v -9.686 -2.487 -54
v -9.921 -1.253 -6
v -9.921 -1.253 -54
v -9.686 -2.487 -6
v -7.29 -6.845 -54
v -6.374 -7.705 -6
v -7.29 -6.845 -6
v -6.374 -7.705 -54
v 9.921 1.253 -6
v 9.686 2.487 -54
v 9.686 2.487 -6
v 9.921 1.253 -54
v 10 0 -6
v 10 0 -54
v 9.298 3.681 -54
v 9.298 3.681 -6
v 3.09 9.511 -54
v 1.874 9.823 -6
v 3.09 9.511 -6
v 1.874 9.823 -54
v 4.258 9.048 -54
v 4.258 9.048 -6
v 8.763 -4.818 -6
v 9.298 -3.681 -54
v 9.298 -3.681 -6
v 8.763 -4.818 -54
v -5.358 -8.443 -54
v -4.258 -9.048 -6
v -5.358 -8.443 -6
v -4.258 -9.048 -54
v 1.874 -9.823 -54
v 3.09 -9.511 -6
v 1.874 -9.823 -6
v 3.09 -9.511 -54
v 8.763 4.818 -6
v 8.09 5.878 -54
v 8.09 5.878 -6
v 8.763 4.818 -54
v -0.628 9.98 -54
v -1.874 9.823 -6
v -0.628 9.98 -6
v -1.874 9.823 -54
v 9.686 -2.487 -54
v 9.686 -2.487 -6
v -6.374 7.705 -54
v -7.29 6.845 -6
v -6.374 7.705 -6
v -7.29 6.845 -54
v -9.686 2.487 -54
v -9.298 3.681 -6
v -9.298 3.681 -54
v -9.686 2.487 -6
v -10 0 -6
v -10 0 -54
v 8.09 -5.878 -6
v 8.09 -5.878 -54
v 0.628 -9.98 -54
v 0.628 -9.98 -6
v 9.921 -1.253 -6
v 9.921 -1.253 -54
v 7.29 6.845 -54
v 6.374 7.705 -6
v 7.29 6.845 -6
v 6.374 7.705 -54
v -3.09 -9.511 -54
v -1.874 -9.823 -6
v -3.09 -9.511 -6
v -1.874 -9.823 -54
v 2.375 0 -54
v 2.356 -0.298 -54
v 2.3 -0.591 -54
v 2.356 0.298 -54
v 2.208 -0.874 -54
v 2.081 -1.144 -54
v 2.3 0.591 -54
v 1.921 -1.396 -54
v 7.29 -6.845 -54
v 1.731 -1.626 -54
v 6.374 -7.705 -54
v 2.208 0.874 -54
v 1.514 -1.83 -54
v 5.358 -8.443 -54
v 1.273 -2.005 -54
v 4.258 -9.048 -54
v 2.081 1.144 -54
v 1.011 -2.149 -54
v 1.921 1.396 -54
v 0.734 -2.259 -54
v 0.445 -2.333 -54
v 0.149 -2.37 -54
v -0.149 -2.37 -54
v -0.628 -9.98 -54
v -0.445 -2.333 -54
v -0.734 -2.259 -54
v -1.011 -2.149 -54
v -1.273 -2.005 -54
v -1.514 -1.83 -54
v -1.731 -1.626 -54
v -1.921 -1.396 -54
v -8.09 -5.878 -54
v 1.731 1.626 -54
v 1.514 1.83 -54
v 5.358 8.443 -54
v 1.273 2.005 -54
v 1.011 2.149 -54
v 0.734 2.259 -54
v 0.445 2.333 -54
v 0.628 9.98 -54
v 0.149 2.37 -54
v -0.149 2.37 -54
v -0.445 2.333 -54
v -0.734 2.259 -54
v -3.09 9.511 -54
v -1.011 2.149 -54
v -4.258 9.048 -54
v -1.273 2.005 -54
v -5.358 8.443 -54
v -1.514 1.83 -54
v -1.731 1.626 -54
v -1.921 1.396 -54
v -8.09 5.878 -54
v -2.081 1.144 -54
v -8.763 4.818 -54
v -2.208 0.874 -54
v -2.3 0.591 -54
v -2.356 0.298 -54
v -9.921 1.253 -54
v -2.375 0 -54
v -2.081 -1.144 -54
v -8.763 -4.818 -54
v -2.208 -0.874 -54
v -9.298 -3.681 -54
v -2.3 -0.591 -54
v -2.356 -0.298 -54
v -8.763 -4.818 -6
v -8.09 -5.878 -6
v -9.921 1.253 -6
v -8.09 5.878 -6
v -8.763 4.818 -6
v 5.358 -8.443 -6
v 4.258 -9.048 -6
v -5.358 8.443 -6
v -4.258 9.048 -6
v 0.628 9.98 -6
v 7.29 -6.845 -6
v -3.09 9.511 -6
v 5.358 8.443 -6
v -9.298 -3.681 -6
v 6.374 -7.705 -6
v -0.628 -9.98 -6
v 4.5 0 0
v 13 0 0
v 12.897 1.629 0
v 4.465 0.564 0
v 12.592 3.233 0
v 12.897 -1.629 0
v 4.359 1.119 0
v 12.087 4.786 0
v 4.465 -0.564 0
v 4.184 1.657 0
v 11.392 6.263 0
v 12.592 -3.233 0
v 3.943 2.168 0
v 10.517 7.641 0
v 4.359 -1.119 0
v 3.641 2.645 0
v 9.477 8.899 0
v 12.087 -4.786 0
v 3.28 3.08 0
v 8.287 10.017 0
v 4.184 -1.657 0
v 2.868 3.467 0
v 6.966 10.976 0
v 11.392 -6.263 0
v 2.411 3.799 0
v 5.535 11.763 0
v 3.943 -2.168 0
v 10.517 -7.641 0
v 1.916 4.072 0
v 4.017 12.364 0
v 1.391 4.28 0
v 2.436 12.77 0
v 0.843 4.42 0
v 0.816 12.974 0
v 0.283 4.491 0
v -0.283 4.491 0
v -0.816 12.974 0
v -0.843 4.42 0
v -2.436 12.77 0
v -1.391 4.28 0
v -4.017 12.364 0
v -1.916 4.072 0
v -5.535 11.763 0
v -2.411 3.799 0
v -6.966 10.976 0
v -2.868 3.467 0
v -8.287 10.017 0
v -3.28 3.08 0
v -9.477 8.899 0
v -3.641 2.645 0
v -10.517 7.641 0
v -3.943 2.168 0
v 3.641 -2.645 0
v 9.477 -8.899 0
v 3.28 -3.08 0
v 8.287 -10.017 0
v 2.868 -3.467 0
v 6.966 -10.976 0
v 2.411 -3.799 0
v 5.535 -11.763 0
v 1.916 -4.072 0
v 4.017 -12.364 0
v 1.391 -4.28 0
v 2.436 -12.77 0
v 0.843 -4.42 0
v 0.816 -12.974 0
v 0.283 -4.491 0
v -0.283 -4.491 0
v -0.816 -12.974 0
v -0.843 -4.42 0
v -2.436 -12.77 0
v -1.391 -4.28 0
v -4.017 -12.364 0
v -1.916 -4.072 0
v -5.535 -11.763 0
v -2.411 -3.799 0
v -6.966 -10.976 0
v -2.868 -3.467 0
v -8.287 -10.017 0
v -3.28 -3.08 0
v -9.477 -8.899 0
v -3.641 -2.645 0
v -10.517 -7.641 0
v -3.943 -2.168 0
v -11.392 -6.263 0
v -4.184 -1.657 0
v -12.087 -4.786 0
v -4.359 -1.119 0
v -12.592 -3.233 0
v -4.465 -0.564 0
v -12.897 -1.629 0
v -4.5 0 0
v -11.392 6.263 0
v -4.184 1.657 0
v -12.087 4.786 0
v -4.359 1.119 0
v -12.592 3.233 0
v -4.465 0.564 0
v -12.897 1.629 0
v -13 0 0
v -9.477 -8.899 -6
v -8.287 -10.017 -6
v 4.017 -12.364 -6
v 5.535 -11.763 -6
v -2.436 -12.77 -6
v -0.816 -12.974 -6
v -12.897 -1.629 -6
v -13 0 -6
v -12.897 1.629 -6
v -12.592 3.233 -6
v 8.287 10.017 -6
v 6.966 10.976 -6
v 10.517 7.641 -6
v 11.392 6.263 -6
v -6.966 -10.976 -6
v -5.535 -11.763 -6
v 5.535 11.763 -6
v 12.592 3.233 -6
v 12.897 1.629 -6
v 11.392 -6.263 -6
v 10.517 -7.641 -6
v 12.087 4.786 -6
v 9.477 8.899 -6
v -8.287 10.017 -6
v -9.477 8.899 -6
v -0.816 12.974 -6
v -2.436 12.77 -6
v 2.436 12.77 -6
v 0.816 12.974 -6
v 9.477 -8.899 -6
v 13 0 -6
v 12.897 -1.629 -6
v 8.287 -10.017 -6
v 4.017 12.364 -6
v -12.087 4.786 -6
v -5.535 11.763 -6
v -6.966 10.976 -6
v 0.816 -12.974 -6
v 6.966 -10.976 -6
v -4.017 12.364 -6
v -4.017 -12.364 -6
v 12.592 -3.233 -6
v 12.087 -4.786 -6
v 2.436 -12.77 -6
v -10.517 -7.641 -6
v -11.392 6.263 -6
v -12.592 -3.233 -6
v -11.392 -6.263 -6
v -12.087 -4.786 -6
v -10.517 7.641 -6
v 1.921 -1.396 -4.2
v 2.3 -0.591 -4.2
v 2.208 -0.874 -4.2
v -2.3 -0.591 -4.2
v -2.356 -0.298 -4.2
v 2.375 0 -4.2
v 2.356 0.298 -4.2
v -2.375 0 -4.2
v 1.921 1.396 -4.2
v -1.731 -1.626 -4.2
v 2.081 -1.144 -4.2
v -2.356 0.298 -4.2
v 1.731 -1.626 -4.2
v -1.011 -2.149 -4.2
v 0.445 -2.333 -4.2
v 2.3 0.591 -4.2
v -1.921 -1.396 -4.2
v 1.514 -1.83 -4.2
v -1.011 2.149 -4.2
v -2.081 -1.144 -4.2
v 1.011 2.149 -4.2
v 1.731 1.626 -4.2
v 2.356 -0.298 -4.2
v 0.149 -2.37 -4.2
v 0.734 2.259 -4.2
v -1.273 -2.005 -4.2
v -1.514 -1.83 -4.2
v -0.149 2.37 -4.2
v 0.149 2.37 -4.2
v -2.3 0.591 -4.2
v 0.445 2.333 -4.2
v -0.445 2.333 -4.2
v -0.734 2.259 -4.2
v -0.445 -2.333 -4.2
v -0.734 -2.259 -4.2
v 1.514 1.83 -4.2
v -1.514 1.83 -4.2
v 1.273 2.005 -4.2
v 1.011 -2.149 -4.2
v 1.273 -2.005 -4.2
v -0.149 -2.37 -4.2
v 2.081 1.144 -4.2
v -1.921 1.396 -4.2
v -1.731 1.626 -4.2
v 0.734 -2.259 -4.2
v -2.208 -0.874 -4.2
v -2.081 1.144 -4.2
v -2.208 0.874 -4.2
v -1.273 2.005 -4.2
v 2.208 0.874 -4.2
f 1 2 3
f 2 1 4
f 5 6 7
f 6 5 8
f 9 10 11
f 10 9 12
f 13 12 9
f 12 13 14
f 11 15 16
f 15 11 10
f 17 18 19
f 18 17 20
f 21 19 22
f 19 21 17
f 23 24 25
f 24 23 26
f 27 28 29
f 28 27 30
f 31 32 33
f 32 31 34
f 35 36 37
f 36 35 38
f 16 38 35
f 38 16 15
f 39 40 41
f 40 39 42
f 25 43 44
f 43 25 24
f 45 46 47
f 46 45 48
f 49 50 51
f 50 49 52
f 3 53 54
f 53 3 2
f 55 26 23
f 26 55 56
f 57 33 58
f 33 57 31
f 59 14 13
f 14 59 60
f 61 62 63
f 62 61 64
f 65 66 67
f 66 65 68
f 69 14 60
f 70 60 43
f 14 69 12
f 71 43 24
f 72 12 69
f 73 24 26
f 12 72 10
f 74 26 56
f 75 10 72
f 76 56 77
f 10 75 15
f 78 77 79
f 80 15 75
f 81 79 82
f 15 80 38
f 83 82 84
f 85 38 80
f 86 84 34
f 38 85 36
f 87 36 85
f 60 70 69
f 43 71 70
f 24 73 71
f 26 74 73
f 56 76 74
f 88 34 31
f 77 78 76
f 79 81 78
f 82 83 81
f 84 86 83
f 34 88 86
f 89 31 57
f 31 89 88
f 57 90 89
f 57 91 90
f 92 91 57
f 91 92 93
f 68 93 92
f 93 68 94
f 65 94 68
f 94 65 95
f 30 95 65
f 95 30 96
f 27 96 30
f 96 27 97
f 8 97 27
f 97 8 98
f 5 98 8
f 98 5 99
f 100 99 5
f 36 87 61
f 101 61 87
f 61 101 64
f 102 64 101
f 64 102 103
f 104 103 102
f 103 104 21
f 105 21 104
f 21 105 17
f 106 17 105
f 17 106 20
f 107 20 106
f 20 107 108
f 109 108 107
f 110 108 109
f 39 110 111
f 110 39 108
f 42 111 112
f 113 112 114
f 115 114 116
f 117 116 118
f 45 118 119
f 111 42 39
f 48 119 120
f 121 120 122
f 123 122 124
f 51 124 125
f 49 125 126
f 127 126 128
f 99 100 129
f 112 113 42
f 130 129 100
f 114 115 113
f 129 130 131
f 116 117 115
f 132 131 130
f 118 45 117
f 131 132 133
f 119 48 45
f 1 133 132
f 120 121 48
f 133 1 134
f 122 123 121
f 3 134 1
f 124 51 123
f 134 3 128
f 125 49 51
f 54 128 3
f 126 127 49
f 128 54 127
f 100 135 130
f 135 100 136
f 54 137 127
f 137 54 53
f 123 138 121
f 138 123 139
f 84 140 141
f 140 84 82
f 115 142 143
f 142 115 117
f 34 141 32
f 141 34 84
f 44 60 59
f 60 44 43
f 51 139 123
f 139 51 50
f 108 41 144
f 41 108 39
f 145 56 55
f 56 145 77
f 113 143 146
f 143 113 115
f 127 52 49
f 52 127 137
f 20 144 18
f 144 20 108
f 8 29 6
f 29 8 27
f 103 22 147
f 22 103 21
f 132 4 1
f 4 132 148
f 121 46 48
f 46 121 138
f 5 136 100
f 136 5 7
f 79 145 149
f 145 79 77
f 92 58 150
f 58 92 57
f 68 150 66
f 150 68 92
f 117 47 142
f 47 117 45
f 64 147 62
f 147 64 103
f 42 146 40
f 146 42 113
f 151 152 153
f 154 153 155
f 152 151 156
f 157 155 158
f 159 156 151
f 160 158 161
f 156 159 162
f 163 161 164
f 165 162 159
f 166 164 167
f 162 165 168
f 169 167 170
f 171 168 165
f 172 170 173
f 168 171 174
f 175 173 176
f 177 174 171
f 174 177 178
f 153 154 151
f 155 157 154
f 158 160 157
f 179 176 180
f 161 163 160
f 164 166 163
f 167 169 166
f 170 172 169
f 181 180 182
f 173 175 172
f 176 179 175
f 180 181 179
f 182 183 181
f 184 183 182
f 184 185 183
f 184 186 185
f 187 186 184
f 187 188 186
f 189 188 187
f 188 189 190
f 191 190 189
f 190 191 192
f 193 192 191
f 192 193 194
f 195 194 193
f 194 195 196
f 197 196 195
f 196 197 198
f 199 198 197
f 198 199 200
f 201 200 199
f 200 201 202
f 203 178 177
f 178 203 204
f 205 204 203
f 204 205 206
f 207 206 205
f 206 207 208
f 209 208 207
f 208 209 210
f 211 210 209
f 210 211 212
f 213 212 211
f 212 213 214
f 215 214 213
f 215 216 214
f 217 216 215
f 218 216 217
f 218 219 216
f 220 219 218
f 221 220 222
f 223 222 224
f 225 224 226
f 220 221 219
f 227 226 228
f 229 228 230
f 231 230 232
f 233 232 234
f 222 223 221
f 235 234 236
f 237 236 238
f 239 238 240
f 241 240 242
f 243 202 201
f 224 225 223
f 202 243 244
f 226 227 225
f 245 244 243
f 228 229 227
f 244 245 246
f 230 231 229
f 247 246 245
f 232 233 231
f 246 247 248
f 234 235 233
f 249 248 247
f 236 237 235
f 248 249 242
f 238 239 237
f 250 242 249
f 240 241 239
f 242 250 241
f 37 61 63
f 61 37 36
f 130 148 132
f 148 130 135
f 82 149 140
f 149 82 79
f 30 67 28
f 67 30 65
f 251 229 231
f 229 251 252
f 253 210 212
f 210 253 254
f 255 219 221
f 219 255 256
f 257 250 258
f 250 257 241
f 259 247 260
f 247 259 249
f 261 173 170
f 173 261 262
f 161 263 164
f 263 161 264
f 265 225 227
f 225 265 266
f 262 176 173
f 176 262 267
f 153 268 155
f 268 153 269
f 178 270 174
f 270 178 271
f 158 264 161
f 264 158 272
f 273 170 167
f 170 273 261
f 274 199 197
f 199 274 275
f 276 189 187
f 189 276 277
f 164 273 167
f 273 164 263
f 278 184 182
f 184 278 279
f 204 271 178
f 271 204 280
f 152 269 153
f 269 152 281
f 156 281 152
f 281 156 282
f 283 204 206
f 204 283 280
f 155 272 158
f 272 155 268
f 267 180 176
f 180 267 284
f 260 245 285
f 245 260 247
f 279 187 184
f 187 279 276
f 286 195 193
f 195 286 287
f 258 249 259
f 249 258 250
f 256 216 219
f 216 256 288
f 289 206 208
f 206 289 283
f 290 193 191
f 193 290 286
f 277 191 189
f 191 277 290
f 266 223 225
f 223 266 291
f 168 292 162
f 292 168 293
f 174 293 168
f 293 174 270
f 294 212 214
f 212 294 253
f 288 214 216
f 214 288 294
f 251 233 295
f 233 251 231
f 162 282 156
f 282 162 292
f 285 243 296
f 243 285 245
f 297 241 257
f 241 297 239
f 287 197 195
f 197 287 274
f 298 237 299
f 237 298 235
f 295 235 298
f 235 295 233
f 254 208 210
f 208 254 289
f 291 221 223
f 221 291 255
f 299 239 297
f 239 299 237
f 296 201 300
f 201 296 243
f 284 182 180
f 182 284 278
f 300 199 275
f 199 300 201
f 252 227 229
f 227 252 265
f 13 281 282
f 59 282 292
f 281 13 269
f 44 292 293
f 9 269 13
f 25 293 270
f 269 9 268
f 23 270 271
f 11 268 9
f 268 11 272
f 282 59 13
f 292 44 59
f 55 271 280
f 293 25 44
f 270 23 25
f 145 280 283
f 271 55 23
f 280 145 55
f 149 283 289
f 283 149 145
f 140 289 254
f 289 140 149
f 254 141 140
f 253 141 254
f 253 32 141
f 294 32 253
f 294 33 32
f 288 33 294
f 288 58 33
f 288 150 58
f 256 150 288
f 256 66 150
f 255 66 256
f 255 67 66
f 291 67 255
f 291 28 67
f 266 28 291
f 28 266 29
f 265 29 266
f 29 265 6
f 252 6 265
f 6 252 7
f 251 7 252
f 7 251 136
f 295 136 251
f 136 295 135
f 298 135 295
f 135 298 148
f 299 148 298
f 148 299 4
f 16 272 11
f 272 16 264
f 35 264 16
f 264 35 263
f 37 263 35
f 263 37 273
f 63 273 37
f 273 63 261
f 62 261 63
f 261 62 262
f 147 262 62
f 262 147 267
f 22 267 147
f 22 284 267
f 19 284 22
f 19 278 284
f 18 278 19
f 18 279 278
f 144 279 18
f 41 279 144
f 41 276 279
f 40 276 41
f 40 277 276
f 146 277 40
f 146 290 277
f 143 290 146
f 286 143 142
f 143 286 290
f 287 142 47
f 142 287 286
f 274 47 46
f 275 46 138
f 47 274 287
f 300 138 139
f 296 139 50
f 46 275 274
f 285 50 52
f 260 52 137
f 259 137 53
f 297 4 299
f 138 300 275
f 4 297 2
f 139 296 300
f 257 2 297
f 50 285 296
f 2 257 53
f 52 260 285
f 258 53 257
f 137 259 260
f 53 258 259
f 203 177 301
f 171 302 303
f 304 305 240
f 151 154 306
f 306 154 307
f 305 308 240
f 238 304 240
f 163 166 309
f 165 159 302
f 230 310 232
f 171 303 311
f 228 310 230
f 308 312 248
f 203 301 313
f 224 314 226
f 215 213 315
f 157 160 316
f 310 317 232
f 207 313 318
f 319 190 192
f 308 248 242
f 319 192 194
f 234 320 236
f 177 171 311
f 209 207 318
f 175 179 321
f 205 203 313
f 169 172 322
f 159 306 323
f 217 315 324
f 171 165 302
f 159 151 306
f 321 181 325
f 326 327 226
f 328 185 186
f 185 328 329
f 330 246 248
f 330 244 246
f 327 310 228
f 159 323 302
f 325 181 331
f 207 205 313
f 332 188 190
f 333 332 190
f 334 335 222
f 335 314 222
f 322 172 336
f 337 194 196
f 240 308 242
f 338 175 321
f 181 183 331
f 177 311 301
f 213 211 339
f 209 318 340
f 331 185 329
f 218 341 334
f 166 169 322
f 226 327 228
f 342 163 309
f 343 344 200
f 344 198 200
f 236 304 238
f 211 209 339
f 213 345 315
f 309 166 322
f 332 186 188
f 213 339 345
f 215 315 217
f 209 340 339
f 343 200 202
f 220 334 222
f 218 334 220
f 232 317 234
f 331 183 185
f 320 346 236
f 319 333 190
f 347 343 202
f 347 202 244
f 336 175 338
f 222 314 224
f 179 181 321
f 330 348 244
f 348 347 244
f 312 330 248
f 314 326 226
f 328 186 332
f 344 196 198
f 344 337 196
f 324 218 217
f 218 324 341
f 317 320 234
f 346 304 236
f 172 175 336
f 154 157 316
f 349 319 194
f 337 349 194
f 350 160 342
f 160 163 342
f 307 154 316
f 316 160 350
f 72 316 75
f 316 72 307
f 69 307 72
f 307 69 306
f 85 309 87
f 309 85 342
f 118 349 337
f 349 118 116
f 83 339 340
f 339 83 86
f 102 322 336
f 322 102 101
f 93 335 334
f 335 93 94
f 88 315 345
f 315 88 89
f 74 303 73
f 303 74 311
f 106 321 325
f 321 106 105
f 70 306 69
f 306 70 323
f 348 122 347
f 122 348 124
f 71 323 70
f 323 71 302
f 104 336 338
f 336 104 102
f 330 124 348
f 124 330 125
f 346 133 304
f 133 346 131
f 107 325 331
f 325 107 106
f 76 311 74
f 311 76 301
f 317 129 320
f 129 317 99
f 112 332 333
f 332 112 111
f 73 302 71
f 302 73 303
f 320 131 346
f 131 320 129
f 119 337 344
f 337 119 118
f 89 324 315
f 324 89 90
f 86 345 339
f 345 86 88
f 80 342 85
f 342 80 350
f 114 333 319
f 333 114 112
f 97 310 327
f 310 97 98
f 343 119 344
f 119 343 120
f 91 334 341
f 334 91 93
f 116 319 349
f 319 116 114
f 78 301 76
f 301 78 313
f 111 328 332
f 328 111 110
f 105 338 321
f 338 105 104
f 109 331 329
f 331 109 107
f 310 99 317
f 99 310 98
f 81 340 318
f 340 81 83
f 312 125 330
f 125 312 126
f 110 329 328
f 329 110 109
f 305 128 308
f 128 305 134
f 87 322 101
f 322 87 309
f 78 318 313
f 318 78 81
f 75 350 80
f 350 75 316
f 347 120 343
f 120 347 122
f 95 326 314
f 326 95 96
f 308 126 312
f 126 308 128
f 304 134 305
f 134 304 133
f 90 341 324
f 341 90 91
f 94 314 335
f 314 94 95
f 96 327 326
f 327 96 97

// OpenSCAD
$fn = 50;


difference() {
	union() {
		translate(v = [0, 0, -54.0000000000]) {
			cylinder(h = 54, r = 10.0000000000);
		}
		translate(v = [0, 0, -6.0000000000]) {
			cylinder(h = 6, r = 13.0000000000);
		}
	}
	union() {
		translate(v = [0, 0, 0]) {
			rotate(a = [0, 0, 0]) {
				difference() {
					union() {
						#translate(v = [0, 0, -54.0000000000]) {
							cylinder(h = 54, r = 2.2500000000);
						}
						#translate(v = [0, 0, -4.2000000000]) {
							cylinder(h = 4.2000000000, r = 10.0000000000, r1 = 2.3750000000, r2 = 4.5000000000);
						}
						#translate(v = [0, 0, -54.0000000000]) {
							cylinder(h = 54, r = 2.3750000000);
						}
						#translate(v = [0, 0, -54.0000000000]) {
							cylinder(h = 54, r = 2.2500000000);
						}
					}
					union();
				}
			}
		}
	}
}
